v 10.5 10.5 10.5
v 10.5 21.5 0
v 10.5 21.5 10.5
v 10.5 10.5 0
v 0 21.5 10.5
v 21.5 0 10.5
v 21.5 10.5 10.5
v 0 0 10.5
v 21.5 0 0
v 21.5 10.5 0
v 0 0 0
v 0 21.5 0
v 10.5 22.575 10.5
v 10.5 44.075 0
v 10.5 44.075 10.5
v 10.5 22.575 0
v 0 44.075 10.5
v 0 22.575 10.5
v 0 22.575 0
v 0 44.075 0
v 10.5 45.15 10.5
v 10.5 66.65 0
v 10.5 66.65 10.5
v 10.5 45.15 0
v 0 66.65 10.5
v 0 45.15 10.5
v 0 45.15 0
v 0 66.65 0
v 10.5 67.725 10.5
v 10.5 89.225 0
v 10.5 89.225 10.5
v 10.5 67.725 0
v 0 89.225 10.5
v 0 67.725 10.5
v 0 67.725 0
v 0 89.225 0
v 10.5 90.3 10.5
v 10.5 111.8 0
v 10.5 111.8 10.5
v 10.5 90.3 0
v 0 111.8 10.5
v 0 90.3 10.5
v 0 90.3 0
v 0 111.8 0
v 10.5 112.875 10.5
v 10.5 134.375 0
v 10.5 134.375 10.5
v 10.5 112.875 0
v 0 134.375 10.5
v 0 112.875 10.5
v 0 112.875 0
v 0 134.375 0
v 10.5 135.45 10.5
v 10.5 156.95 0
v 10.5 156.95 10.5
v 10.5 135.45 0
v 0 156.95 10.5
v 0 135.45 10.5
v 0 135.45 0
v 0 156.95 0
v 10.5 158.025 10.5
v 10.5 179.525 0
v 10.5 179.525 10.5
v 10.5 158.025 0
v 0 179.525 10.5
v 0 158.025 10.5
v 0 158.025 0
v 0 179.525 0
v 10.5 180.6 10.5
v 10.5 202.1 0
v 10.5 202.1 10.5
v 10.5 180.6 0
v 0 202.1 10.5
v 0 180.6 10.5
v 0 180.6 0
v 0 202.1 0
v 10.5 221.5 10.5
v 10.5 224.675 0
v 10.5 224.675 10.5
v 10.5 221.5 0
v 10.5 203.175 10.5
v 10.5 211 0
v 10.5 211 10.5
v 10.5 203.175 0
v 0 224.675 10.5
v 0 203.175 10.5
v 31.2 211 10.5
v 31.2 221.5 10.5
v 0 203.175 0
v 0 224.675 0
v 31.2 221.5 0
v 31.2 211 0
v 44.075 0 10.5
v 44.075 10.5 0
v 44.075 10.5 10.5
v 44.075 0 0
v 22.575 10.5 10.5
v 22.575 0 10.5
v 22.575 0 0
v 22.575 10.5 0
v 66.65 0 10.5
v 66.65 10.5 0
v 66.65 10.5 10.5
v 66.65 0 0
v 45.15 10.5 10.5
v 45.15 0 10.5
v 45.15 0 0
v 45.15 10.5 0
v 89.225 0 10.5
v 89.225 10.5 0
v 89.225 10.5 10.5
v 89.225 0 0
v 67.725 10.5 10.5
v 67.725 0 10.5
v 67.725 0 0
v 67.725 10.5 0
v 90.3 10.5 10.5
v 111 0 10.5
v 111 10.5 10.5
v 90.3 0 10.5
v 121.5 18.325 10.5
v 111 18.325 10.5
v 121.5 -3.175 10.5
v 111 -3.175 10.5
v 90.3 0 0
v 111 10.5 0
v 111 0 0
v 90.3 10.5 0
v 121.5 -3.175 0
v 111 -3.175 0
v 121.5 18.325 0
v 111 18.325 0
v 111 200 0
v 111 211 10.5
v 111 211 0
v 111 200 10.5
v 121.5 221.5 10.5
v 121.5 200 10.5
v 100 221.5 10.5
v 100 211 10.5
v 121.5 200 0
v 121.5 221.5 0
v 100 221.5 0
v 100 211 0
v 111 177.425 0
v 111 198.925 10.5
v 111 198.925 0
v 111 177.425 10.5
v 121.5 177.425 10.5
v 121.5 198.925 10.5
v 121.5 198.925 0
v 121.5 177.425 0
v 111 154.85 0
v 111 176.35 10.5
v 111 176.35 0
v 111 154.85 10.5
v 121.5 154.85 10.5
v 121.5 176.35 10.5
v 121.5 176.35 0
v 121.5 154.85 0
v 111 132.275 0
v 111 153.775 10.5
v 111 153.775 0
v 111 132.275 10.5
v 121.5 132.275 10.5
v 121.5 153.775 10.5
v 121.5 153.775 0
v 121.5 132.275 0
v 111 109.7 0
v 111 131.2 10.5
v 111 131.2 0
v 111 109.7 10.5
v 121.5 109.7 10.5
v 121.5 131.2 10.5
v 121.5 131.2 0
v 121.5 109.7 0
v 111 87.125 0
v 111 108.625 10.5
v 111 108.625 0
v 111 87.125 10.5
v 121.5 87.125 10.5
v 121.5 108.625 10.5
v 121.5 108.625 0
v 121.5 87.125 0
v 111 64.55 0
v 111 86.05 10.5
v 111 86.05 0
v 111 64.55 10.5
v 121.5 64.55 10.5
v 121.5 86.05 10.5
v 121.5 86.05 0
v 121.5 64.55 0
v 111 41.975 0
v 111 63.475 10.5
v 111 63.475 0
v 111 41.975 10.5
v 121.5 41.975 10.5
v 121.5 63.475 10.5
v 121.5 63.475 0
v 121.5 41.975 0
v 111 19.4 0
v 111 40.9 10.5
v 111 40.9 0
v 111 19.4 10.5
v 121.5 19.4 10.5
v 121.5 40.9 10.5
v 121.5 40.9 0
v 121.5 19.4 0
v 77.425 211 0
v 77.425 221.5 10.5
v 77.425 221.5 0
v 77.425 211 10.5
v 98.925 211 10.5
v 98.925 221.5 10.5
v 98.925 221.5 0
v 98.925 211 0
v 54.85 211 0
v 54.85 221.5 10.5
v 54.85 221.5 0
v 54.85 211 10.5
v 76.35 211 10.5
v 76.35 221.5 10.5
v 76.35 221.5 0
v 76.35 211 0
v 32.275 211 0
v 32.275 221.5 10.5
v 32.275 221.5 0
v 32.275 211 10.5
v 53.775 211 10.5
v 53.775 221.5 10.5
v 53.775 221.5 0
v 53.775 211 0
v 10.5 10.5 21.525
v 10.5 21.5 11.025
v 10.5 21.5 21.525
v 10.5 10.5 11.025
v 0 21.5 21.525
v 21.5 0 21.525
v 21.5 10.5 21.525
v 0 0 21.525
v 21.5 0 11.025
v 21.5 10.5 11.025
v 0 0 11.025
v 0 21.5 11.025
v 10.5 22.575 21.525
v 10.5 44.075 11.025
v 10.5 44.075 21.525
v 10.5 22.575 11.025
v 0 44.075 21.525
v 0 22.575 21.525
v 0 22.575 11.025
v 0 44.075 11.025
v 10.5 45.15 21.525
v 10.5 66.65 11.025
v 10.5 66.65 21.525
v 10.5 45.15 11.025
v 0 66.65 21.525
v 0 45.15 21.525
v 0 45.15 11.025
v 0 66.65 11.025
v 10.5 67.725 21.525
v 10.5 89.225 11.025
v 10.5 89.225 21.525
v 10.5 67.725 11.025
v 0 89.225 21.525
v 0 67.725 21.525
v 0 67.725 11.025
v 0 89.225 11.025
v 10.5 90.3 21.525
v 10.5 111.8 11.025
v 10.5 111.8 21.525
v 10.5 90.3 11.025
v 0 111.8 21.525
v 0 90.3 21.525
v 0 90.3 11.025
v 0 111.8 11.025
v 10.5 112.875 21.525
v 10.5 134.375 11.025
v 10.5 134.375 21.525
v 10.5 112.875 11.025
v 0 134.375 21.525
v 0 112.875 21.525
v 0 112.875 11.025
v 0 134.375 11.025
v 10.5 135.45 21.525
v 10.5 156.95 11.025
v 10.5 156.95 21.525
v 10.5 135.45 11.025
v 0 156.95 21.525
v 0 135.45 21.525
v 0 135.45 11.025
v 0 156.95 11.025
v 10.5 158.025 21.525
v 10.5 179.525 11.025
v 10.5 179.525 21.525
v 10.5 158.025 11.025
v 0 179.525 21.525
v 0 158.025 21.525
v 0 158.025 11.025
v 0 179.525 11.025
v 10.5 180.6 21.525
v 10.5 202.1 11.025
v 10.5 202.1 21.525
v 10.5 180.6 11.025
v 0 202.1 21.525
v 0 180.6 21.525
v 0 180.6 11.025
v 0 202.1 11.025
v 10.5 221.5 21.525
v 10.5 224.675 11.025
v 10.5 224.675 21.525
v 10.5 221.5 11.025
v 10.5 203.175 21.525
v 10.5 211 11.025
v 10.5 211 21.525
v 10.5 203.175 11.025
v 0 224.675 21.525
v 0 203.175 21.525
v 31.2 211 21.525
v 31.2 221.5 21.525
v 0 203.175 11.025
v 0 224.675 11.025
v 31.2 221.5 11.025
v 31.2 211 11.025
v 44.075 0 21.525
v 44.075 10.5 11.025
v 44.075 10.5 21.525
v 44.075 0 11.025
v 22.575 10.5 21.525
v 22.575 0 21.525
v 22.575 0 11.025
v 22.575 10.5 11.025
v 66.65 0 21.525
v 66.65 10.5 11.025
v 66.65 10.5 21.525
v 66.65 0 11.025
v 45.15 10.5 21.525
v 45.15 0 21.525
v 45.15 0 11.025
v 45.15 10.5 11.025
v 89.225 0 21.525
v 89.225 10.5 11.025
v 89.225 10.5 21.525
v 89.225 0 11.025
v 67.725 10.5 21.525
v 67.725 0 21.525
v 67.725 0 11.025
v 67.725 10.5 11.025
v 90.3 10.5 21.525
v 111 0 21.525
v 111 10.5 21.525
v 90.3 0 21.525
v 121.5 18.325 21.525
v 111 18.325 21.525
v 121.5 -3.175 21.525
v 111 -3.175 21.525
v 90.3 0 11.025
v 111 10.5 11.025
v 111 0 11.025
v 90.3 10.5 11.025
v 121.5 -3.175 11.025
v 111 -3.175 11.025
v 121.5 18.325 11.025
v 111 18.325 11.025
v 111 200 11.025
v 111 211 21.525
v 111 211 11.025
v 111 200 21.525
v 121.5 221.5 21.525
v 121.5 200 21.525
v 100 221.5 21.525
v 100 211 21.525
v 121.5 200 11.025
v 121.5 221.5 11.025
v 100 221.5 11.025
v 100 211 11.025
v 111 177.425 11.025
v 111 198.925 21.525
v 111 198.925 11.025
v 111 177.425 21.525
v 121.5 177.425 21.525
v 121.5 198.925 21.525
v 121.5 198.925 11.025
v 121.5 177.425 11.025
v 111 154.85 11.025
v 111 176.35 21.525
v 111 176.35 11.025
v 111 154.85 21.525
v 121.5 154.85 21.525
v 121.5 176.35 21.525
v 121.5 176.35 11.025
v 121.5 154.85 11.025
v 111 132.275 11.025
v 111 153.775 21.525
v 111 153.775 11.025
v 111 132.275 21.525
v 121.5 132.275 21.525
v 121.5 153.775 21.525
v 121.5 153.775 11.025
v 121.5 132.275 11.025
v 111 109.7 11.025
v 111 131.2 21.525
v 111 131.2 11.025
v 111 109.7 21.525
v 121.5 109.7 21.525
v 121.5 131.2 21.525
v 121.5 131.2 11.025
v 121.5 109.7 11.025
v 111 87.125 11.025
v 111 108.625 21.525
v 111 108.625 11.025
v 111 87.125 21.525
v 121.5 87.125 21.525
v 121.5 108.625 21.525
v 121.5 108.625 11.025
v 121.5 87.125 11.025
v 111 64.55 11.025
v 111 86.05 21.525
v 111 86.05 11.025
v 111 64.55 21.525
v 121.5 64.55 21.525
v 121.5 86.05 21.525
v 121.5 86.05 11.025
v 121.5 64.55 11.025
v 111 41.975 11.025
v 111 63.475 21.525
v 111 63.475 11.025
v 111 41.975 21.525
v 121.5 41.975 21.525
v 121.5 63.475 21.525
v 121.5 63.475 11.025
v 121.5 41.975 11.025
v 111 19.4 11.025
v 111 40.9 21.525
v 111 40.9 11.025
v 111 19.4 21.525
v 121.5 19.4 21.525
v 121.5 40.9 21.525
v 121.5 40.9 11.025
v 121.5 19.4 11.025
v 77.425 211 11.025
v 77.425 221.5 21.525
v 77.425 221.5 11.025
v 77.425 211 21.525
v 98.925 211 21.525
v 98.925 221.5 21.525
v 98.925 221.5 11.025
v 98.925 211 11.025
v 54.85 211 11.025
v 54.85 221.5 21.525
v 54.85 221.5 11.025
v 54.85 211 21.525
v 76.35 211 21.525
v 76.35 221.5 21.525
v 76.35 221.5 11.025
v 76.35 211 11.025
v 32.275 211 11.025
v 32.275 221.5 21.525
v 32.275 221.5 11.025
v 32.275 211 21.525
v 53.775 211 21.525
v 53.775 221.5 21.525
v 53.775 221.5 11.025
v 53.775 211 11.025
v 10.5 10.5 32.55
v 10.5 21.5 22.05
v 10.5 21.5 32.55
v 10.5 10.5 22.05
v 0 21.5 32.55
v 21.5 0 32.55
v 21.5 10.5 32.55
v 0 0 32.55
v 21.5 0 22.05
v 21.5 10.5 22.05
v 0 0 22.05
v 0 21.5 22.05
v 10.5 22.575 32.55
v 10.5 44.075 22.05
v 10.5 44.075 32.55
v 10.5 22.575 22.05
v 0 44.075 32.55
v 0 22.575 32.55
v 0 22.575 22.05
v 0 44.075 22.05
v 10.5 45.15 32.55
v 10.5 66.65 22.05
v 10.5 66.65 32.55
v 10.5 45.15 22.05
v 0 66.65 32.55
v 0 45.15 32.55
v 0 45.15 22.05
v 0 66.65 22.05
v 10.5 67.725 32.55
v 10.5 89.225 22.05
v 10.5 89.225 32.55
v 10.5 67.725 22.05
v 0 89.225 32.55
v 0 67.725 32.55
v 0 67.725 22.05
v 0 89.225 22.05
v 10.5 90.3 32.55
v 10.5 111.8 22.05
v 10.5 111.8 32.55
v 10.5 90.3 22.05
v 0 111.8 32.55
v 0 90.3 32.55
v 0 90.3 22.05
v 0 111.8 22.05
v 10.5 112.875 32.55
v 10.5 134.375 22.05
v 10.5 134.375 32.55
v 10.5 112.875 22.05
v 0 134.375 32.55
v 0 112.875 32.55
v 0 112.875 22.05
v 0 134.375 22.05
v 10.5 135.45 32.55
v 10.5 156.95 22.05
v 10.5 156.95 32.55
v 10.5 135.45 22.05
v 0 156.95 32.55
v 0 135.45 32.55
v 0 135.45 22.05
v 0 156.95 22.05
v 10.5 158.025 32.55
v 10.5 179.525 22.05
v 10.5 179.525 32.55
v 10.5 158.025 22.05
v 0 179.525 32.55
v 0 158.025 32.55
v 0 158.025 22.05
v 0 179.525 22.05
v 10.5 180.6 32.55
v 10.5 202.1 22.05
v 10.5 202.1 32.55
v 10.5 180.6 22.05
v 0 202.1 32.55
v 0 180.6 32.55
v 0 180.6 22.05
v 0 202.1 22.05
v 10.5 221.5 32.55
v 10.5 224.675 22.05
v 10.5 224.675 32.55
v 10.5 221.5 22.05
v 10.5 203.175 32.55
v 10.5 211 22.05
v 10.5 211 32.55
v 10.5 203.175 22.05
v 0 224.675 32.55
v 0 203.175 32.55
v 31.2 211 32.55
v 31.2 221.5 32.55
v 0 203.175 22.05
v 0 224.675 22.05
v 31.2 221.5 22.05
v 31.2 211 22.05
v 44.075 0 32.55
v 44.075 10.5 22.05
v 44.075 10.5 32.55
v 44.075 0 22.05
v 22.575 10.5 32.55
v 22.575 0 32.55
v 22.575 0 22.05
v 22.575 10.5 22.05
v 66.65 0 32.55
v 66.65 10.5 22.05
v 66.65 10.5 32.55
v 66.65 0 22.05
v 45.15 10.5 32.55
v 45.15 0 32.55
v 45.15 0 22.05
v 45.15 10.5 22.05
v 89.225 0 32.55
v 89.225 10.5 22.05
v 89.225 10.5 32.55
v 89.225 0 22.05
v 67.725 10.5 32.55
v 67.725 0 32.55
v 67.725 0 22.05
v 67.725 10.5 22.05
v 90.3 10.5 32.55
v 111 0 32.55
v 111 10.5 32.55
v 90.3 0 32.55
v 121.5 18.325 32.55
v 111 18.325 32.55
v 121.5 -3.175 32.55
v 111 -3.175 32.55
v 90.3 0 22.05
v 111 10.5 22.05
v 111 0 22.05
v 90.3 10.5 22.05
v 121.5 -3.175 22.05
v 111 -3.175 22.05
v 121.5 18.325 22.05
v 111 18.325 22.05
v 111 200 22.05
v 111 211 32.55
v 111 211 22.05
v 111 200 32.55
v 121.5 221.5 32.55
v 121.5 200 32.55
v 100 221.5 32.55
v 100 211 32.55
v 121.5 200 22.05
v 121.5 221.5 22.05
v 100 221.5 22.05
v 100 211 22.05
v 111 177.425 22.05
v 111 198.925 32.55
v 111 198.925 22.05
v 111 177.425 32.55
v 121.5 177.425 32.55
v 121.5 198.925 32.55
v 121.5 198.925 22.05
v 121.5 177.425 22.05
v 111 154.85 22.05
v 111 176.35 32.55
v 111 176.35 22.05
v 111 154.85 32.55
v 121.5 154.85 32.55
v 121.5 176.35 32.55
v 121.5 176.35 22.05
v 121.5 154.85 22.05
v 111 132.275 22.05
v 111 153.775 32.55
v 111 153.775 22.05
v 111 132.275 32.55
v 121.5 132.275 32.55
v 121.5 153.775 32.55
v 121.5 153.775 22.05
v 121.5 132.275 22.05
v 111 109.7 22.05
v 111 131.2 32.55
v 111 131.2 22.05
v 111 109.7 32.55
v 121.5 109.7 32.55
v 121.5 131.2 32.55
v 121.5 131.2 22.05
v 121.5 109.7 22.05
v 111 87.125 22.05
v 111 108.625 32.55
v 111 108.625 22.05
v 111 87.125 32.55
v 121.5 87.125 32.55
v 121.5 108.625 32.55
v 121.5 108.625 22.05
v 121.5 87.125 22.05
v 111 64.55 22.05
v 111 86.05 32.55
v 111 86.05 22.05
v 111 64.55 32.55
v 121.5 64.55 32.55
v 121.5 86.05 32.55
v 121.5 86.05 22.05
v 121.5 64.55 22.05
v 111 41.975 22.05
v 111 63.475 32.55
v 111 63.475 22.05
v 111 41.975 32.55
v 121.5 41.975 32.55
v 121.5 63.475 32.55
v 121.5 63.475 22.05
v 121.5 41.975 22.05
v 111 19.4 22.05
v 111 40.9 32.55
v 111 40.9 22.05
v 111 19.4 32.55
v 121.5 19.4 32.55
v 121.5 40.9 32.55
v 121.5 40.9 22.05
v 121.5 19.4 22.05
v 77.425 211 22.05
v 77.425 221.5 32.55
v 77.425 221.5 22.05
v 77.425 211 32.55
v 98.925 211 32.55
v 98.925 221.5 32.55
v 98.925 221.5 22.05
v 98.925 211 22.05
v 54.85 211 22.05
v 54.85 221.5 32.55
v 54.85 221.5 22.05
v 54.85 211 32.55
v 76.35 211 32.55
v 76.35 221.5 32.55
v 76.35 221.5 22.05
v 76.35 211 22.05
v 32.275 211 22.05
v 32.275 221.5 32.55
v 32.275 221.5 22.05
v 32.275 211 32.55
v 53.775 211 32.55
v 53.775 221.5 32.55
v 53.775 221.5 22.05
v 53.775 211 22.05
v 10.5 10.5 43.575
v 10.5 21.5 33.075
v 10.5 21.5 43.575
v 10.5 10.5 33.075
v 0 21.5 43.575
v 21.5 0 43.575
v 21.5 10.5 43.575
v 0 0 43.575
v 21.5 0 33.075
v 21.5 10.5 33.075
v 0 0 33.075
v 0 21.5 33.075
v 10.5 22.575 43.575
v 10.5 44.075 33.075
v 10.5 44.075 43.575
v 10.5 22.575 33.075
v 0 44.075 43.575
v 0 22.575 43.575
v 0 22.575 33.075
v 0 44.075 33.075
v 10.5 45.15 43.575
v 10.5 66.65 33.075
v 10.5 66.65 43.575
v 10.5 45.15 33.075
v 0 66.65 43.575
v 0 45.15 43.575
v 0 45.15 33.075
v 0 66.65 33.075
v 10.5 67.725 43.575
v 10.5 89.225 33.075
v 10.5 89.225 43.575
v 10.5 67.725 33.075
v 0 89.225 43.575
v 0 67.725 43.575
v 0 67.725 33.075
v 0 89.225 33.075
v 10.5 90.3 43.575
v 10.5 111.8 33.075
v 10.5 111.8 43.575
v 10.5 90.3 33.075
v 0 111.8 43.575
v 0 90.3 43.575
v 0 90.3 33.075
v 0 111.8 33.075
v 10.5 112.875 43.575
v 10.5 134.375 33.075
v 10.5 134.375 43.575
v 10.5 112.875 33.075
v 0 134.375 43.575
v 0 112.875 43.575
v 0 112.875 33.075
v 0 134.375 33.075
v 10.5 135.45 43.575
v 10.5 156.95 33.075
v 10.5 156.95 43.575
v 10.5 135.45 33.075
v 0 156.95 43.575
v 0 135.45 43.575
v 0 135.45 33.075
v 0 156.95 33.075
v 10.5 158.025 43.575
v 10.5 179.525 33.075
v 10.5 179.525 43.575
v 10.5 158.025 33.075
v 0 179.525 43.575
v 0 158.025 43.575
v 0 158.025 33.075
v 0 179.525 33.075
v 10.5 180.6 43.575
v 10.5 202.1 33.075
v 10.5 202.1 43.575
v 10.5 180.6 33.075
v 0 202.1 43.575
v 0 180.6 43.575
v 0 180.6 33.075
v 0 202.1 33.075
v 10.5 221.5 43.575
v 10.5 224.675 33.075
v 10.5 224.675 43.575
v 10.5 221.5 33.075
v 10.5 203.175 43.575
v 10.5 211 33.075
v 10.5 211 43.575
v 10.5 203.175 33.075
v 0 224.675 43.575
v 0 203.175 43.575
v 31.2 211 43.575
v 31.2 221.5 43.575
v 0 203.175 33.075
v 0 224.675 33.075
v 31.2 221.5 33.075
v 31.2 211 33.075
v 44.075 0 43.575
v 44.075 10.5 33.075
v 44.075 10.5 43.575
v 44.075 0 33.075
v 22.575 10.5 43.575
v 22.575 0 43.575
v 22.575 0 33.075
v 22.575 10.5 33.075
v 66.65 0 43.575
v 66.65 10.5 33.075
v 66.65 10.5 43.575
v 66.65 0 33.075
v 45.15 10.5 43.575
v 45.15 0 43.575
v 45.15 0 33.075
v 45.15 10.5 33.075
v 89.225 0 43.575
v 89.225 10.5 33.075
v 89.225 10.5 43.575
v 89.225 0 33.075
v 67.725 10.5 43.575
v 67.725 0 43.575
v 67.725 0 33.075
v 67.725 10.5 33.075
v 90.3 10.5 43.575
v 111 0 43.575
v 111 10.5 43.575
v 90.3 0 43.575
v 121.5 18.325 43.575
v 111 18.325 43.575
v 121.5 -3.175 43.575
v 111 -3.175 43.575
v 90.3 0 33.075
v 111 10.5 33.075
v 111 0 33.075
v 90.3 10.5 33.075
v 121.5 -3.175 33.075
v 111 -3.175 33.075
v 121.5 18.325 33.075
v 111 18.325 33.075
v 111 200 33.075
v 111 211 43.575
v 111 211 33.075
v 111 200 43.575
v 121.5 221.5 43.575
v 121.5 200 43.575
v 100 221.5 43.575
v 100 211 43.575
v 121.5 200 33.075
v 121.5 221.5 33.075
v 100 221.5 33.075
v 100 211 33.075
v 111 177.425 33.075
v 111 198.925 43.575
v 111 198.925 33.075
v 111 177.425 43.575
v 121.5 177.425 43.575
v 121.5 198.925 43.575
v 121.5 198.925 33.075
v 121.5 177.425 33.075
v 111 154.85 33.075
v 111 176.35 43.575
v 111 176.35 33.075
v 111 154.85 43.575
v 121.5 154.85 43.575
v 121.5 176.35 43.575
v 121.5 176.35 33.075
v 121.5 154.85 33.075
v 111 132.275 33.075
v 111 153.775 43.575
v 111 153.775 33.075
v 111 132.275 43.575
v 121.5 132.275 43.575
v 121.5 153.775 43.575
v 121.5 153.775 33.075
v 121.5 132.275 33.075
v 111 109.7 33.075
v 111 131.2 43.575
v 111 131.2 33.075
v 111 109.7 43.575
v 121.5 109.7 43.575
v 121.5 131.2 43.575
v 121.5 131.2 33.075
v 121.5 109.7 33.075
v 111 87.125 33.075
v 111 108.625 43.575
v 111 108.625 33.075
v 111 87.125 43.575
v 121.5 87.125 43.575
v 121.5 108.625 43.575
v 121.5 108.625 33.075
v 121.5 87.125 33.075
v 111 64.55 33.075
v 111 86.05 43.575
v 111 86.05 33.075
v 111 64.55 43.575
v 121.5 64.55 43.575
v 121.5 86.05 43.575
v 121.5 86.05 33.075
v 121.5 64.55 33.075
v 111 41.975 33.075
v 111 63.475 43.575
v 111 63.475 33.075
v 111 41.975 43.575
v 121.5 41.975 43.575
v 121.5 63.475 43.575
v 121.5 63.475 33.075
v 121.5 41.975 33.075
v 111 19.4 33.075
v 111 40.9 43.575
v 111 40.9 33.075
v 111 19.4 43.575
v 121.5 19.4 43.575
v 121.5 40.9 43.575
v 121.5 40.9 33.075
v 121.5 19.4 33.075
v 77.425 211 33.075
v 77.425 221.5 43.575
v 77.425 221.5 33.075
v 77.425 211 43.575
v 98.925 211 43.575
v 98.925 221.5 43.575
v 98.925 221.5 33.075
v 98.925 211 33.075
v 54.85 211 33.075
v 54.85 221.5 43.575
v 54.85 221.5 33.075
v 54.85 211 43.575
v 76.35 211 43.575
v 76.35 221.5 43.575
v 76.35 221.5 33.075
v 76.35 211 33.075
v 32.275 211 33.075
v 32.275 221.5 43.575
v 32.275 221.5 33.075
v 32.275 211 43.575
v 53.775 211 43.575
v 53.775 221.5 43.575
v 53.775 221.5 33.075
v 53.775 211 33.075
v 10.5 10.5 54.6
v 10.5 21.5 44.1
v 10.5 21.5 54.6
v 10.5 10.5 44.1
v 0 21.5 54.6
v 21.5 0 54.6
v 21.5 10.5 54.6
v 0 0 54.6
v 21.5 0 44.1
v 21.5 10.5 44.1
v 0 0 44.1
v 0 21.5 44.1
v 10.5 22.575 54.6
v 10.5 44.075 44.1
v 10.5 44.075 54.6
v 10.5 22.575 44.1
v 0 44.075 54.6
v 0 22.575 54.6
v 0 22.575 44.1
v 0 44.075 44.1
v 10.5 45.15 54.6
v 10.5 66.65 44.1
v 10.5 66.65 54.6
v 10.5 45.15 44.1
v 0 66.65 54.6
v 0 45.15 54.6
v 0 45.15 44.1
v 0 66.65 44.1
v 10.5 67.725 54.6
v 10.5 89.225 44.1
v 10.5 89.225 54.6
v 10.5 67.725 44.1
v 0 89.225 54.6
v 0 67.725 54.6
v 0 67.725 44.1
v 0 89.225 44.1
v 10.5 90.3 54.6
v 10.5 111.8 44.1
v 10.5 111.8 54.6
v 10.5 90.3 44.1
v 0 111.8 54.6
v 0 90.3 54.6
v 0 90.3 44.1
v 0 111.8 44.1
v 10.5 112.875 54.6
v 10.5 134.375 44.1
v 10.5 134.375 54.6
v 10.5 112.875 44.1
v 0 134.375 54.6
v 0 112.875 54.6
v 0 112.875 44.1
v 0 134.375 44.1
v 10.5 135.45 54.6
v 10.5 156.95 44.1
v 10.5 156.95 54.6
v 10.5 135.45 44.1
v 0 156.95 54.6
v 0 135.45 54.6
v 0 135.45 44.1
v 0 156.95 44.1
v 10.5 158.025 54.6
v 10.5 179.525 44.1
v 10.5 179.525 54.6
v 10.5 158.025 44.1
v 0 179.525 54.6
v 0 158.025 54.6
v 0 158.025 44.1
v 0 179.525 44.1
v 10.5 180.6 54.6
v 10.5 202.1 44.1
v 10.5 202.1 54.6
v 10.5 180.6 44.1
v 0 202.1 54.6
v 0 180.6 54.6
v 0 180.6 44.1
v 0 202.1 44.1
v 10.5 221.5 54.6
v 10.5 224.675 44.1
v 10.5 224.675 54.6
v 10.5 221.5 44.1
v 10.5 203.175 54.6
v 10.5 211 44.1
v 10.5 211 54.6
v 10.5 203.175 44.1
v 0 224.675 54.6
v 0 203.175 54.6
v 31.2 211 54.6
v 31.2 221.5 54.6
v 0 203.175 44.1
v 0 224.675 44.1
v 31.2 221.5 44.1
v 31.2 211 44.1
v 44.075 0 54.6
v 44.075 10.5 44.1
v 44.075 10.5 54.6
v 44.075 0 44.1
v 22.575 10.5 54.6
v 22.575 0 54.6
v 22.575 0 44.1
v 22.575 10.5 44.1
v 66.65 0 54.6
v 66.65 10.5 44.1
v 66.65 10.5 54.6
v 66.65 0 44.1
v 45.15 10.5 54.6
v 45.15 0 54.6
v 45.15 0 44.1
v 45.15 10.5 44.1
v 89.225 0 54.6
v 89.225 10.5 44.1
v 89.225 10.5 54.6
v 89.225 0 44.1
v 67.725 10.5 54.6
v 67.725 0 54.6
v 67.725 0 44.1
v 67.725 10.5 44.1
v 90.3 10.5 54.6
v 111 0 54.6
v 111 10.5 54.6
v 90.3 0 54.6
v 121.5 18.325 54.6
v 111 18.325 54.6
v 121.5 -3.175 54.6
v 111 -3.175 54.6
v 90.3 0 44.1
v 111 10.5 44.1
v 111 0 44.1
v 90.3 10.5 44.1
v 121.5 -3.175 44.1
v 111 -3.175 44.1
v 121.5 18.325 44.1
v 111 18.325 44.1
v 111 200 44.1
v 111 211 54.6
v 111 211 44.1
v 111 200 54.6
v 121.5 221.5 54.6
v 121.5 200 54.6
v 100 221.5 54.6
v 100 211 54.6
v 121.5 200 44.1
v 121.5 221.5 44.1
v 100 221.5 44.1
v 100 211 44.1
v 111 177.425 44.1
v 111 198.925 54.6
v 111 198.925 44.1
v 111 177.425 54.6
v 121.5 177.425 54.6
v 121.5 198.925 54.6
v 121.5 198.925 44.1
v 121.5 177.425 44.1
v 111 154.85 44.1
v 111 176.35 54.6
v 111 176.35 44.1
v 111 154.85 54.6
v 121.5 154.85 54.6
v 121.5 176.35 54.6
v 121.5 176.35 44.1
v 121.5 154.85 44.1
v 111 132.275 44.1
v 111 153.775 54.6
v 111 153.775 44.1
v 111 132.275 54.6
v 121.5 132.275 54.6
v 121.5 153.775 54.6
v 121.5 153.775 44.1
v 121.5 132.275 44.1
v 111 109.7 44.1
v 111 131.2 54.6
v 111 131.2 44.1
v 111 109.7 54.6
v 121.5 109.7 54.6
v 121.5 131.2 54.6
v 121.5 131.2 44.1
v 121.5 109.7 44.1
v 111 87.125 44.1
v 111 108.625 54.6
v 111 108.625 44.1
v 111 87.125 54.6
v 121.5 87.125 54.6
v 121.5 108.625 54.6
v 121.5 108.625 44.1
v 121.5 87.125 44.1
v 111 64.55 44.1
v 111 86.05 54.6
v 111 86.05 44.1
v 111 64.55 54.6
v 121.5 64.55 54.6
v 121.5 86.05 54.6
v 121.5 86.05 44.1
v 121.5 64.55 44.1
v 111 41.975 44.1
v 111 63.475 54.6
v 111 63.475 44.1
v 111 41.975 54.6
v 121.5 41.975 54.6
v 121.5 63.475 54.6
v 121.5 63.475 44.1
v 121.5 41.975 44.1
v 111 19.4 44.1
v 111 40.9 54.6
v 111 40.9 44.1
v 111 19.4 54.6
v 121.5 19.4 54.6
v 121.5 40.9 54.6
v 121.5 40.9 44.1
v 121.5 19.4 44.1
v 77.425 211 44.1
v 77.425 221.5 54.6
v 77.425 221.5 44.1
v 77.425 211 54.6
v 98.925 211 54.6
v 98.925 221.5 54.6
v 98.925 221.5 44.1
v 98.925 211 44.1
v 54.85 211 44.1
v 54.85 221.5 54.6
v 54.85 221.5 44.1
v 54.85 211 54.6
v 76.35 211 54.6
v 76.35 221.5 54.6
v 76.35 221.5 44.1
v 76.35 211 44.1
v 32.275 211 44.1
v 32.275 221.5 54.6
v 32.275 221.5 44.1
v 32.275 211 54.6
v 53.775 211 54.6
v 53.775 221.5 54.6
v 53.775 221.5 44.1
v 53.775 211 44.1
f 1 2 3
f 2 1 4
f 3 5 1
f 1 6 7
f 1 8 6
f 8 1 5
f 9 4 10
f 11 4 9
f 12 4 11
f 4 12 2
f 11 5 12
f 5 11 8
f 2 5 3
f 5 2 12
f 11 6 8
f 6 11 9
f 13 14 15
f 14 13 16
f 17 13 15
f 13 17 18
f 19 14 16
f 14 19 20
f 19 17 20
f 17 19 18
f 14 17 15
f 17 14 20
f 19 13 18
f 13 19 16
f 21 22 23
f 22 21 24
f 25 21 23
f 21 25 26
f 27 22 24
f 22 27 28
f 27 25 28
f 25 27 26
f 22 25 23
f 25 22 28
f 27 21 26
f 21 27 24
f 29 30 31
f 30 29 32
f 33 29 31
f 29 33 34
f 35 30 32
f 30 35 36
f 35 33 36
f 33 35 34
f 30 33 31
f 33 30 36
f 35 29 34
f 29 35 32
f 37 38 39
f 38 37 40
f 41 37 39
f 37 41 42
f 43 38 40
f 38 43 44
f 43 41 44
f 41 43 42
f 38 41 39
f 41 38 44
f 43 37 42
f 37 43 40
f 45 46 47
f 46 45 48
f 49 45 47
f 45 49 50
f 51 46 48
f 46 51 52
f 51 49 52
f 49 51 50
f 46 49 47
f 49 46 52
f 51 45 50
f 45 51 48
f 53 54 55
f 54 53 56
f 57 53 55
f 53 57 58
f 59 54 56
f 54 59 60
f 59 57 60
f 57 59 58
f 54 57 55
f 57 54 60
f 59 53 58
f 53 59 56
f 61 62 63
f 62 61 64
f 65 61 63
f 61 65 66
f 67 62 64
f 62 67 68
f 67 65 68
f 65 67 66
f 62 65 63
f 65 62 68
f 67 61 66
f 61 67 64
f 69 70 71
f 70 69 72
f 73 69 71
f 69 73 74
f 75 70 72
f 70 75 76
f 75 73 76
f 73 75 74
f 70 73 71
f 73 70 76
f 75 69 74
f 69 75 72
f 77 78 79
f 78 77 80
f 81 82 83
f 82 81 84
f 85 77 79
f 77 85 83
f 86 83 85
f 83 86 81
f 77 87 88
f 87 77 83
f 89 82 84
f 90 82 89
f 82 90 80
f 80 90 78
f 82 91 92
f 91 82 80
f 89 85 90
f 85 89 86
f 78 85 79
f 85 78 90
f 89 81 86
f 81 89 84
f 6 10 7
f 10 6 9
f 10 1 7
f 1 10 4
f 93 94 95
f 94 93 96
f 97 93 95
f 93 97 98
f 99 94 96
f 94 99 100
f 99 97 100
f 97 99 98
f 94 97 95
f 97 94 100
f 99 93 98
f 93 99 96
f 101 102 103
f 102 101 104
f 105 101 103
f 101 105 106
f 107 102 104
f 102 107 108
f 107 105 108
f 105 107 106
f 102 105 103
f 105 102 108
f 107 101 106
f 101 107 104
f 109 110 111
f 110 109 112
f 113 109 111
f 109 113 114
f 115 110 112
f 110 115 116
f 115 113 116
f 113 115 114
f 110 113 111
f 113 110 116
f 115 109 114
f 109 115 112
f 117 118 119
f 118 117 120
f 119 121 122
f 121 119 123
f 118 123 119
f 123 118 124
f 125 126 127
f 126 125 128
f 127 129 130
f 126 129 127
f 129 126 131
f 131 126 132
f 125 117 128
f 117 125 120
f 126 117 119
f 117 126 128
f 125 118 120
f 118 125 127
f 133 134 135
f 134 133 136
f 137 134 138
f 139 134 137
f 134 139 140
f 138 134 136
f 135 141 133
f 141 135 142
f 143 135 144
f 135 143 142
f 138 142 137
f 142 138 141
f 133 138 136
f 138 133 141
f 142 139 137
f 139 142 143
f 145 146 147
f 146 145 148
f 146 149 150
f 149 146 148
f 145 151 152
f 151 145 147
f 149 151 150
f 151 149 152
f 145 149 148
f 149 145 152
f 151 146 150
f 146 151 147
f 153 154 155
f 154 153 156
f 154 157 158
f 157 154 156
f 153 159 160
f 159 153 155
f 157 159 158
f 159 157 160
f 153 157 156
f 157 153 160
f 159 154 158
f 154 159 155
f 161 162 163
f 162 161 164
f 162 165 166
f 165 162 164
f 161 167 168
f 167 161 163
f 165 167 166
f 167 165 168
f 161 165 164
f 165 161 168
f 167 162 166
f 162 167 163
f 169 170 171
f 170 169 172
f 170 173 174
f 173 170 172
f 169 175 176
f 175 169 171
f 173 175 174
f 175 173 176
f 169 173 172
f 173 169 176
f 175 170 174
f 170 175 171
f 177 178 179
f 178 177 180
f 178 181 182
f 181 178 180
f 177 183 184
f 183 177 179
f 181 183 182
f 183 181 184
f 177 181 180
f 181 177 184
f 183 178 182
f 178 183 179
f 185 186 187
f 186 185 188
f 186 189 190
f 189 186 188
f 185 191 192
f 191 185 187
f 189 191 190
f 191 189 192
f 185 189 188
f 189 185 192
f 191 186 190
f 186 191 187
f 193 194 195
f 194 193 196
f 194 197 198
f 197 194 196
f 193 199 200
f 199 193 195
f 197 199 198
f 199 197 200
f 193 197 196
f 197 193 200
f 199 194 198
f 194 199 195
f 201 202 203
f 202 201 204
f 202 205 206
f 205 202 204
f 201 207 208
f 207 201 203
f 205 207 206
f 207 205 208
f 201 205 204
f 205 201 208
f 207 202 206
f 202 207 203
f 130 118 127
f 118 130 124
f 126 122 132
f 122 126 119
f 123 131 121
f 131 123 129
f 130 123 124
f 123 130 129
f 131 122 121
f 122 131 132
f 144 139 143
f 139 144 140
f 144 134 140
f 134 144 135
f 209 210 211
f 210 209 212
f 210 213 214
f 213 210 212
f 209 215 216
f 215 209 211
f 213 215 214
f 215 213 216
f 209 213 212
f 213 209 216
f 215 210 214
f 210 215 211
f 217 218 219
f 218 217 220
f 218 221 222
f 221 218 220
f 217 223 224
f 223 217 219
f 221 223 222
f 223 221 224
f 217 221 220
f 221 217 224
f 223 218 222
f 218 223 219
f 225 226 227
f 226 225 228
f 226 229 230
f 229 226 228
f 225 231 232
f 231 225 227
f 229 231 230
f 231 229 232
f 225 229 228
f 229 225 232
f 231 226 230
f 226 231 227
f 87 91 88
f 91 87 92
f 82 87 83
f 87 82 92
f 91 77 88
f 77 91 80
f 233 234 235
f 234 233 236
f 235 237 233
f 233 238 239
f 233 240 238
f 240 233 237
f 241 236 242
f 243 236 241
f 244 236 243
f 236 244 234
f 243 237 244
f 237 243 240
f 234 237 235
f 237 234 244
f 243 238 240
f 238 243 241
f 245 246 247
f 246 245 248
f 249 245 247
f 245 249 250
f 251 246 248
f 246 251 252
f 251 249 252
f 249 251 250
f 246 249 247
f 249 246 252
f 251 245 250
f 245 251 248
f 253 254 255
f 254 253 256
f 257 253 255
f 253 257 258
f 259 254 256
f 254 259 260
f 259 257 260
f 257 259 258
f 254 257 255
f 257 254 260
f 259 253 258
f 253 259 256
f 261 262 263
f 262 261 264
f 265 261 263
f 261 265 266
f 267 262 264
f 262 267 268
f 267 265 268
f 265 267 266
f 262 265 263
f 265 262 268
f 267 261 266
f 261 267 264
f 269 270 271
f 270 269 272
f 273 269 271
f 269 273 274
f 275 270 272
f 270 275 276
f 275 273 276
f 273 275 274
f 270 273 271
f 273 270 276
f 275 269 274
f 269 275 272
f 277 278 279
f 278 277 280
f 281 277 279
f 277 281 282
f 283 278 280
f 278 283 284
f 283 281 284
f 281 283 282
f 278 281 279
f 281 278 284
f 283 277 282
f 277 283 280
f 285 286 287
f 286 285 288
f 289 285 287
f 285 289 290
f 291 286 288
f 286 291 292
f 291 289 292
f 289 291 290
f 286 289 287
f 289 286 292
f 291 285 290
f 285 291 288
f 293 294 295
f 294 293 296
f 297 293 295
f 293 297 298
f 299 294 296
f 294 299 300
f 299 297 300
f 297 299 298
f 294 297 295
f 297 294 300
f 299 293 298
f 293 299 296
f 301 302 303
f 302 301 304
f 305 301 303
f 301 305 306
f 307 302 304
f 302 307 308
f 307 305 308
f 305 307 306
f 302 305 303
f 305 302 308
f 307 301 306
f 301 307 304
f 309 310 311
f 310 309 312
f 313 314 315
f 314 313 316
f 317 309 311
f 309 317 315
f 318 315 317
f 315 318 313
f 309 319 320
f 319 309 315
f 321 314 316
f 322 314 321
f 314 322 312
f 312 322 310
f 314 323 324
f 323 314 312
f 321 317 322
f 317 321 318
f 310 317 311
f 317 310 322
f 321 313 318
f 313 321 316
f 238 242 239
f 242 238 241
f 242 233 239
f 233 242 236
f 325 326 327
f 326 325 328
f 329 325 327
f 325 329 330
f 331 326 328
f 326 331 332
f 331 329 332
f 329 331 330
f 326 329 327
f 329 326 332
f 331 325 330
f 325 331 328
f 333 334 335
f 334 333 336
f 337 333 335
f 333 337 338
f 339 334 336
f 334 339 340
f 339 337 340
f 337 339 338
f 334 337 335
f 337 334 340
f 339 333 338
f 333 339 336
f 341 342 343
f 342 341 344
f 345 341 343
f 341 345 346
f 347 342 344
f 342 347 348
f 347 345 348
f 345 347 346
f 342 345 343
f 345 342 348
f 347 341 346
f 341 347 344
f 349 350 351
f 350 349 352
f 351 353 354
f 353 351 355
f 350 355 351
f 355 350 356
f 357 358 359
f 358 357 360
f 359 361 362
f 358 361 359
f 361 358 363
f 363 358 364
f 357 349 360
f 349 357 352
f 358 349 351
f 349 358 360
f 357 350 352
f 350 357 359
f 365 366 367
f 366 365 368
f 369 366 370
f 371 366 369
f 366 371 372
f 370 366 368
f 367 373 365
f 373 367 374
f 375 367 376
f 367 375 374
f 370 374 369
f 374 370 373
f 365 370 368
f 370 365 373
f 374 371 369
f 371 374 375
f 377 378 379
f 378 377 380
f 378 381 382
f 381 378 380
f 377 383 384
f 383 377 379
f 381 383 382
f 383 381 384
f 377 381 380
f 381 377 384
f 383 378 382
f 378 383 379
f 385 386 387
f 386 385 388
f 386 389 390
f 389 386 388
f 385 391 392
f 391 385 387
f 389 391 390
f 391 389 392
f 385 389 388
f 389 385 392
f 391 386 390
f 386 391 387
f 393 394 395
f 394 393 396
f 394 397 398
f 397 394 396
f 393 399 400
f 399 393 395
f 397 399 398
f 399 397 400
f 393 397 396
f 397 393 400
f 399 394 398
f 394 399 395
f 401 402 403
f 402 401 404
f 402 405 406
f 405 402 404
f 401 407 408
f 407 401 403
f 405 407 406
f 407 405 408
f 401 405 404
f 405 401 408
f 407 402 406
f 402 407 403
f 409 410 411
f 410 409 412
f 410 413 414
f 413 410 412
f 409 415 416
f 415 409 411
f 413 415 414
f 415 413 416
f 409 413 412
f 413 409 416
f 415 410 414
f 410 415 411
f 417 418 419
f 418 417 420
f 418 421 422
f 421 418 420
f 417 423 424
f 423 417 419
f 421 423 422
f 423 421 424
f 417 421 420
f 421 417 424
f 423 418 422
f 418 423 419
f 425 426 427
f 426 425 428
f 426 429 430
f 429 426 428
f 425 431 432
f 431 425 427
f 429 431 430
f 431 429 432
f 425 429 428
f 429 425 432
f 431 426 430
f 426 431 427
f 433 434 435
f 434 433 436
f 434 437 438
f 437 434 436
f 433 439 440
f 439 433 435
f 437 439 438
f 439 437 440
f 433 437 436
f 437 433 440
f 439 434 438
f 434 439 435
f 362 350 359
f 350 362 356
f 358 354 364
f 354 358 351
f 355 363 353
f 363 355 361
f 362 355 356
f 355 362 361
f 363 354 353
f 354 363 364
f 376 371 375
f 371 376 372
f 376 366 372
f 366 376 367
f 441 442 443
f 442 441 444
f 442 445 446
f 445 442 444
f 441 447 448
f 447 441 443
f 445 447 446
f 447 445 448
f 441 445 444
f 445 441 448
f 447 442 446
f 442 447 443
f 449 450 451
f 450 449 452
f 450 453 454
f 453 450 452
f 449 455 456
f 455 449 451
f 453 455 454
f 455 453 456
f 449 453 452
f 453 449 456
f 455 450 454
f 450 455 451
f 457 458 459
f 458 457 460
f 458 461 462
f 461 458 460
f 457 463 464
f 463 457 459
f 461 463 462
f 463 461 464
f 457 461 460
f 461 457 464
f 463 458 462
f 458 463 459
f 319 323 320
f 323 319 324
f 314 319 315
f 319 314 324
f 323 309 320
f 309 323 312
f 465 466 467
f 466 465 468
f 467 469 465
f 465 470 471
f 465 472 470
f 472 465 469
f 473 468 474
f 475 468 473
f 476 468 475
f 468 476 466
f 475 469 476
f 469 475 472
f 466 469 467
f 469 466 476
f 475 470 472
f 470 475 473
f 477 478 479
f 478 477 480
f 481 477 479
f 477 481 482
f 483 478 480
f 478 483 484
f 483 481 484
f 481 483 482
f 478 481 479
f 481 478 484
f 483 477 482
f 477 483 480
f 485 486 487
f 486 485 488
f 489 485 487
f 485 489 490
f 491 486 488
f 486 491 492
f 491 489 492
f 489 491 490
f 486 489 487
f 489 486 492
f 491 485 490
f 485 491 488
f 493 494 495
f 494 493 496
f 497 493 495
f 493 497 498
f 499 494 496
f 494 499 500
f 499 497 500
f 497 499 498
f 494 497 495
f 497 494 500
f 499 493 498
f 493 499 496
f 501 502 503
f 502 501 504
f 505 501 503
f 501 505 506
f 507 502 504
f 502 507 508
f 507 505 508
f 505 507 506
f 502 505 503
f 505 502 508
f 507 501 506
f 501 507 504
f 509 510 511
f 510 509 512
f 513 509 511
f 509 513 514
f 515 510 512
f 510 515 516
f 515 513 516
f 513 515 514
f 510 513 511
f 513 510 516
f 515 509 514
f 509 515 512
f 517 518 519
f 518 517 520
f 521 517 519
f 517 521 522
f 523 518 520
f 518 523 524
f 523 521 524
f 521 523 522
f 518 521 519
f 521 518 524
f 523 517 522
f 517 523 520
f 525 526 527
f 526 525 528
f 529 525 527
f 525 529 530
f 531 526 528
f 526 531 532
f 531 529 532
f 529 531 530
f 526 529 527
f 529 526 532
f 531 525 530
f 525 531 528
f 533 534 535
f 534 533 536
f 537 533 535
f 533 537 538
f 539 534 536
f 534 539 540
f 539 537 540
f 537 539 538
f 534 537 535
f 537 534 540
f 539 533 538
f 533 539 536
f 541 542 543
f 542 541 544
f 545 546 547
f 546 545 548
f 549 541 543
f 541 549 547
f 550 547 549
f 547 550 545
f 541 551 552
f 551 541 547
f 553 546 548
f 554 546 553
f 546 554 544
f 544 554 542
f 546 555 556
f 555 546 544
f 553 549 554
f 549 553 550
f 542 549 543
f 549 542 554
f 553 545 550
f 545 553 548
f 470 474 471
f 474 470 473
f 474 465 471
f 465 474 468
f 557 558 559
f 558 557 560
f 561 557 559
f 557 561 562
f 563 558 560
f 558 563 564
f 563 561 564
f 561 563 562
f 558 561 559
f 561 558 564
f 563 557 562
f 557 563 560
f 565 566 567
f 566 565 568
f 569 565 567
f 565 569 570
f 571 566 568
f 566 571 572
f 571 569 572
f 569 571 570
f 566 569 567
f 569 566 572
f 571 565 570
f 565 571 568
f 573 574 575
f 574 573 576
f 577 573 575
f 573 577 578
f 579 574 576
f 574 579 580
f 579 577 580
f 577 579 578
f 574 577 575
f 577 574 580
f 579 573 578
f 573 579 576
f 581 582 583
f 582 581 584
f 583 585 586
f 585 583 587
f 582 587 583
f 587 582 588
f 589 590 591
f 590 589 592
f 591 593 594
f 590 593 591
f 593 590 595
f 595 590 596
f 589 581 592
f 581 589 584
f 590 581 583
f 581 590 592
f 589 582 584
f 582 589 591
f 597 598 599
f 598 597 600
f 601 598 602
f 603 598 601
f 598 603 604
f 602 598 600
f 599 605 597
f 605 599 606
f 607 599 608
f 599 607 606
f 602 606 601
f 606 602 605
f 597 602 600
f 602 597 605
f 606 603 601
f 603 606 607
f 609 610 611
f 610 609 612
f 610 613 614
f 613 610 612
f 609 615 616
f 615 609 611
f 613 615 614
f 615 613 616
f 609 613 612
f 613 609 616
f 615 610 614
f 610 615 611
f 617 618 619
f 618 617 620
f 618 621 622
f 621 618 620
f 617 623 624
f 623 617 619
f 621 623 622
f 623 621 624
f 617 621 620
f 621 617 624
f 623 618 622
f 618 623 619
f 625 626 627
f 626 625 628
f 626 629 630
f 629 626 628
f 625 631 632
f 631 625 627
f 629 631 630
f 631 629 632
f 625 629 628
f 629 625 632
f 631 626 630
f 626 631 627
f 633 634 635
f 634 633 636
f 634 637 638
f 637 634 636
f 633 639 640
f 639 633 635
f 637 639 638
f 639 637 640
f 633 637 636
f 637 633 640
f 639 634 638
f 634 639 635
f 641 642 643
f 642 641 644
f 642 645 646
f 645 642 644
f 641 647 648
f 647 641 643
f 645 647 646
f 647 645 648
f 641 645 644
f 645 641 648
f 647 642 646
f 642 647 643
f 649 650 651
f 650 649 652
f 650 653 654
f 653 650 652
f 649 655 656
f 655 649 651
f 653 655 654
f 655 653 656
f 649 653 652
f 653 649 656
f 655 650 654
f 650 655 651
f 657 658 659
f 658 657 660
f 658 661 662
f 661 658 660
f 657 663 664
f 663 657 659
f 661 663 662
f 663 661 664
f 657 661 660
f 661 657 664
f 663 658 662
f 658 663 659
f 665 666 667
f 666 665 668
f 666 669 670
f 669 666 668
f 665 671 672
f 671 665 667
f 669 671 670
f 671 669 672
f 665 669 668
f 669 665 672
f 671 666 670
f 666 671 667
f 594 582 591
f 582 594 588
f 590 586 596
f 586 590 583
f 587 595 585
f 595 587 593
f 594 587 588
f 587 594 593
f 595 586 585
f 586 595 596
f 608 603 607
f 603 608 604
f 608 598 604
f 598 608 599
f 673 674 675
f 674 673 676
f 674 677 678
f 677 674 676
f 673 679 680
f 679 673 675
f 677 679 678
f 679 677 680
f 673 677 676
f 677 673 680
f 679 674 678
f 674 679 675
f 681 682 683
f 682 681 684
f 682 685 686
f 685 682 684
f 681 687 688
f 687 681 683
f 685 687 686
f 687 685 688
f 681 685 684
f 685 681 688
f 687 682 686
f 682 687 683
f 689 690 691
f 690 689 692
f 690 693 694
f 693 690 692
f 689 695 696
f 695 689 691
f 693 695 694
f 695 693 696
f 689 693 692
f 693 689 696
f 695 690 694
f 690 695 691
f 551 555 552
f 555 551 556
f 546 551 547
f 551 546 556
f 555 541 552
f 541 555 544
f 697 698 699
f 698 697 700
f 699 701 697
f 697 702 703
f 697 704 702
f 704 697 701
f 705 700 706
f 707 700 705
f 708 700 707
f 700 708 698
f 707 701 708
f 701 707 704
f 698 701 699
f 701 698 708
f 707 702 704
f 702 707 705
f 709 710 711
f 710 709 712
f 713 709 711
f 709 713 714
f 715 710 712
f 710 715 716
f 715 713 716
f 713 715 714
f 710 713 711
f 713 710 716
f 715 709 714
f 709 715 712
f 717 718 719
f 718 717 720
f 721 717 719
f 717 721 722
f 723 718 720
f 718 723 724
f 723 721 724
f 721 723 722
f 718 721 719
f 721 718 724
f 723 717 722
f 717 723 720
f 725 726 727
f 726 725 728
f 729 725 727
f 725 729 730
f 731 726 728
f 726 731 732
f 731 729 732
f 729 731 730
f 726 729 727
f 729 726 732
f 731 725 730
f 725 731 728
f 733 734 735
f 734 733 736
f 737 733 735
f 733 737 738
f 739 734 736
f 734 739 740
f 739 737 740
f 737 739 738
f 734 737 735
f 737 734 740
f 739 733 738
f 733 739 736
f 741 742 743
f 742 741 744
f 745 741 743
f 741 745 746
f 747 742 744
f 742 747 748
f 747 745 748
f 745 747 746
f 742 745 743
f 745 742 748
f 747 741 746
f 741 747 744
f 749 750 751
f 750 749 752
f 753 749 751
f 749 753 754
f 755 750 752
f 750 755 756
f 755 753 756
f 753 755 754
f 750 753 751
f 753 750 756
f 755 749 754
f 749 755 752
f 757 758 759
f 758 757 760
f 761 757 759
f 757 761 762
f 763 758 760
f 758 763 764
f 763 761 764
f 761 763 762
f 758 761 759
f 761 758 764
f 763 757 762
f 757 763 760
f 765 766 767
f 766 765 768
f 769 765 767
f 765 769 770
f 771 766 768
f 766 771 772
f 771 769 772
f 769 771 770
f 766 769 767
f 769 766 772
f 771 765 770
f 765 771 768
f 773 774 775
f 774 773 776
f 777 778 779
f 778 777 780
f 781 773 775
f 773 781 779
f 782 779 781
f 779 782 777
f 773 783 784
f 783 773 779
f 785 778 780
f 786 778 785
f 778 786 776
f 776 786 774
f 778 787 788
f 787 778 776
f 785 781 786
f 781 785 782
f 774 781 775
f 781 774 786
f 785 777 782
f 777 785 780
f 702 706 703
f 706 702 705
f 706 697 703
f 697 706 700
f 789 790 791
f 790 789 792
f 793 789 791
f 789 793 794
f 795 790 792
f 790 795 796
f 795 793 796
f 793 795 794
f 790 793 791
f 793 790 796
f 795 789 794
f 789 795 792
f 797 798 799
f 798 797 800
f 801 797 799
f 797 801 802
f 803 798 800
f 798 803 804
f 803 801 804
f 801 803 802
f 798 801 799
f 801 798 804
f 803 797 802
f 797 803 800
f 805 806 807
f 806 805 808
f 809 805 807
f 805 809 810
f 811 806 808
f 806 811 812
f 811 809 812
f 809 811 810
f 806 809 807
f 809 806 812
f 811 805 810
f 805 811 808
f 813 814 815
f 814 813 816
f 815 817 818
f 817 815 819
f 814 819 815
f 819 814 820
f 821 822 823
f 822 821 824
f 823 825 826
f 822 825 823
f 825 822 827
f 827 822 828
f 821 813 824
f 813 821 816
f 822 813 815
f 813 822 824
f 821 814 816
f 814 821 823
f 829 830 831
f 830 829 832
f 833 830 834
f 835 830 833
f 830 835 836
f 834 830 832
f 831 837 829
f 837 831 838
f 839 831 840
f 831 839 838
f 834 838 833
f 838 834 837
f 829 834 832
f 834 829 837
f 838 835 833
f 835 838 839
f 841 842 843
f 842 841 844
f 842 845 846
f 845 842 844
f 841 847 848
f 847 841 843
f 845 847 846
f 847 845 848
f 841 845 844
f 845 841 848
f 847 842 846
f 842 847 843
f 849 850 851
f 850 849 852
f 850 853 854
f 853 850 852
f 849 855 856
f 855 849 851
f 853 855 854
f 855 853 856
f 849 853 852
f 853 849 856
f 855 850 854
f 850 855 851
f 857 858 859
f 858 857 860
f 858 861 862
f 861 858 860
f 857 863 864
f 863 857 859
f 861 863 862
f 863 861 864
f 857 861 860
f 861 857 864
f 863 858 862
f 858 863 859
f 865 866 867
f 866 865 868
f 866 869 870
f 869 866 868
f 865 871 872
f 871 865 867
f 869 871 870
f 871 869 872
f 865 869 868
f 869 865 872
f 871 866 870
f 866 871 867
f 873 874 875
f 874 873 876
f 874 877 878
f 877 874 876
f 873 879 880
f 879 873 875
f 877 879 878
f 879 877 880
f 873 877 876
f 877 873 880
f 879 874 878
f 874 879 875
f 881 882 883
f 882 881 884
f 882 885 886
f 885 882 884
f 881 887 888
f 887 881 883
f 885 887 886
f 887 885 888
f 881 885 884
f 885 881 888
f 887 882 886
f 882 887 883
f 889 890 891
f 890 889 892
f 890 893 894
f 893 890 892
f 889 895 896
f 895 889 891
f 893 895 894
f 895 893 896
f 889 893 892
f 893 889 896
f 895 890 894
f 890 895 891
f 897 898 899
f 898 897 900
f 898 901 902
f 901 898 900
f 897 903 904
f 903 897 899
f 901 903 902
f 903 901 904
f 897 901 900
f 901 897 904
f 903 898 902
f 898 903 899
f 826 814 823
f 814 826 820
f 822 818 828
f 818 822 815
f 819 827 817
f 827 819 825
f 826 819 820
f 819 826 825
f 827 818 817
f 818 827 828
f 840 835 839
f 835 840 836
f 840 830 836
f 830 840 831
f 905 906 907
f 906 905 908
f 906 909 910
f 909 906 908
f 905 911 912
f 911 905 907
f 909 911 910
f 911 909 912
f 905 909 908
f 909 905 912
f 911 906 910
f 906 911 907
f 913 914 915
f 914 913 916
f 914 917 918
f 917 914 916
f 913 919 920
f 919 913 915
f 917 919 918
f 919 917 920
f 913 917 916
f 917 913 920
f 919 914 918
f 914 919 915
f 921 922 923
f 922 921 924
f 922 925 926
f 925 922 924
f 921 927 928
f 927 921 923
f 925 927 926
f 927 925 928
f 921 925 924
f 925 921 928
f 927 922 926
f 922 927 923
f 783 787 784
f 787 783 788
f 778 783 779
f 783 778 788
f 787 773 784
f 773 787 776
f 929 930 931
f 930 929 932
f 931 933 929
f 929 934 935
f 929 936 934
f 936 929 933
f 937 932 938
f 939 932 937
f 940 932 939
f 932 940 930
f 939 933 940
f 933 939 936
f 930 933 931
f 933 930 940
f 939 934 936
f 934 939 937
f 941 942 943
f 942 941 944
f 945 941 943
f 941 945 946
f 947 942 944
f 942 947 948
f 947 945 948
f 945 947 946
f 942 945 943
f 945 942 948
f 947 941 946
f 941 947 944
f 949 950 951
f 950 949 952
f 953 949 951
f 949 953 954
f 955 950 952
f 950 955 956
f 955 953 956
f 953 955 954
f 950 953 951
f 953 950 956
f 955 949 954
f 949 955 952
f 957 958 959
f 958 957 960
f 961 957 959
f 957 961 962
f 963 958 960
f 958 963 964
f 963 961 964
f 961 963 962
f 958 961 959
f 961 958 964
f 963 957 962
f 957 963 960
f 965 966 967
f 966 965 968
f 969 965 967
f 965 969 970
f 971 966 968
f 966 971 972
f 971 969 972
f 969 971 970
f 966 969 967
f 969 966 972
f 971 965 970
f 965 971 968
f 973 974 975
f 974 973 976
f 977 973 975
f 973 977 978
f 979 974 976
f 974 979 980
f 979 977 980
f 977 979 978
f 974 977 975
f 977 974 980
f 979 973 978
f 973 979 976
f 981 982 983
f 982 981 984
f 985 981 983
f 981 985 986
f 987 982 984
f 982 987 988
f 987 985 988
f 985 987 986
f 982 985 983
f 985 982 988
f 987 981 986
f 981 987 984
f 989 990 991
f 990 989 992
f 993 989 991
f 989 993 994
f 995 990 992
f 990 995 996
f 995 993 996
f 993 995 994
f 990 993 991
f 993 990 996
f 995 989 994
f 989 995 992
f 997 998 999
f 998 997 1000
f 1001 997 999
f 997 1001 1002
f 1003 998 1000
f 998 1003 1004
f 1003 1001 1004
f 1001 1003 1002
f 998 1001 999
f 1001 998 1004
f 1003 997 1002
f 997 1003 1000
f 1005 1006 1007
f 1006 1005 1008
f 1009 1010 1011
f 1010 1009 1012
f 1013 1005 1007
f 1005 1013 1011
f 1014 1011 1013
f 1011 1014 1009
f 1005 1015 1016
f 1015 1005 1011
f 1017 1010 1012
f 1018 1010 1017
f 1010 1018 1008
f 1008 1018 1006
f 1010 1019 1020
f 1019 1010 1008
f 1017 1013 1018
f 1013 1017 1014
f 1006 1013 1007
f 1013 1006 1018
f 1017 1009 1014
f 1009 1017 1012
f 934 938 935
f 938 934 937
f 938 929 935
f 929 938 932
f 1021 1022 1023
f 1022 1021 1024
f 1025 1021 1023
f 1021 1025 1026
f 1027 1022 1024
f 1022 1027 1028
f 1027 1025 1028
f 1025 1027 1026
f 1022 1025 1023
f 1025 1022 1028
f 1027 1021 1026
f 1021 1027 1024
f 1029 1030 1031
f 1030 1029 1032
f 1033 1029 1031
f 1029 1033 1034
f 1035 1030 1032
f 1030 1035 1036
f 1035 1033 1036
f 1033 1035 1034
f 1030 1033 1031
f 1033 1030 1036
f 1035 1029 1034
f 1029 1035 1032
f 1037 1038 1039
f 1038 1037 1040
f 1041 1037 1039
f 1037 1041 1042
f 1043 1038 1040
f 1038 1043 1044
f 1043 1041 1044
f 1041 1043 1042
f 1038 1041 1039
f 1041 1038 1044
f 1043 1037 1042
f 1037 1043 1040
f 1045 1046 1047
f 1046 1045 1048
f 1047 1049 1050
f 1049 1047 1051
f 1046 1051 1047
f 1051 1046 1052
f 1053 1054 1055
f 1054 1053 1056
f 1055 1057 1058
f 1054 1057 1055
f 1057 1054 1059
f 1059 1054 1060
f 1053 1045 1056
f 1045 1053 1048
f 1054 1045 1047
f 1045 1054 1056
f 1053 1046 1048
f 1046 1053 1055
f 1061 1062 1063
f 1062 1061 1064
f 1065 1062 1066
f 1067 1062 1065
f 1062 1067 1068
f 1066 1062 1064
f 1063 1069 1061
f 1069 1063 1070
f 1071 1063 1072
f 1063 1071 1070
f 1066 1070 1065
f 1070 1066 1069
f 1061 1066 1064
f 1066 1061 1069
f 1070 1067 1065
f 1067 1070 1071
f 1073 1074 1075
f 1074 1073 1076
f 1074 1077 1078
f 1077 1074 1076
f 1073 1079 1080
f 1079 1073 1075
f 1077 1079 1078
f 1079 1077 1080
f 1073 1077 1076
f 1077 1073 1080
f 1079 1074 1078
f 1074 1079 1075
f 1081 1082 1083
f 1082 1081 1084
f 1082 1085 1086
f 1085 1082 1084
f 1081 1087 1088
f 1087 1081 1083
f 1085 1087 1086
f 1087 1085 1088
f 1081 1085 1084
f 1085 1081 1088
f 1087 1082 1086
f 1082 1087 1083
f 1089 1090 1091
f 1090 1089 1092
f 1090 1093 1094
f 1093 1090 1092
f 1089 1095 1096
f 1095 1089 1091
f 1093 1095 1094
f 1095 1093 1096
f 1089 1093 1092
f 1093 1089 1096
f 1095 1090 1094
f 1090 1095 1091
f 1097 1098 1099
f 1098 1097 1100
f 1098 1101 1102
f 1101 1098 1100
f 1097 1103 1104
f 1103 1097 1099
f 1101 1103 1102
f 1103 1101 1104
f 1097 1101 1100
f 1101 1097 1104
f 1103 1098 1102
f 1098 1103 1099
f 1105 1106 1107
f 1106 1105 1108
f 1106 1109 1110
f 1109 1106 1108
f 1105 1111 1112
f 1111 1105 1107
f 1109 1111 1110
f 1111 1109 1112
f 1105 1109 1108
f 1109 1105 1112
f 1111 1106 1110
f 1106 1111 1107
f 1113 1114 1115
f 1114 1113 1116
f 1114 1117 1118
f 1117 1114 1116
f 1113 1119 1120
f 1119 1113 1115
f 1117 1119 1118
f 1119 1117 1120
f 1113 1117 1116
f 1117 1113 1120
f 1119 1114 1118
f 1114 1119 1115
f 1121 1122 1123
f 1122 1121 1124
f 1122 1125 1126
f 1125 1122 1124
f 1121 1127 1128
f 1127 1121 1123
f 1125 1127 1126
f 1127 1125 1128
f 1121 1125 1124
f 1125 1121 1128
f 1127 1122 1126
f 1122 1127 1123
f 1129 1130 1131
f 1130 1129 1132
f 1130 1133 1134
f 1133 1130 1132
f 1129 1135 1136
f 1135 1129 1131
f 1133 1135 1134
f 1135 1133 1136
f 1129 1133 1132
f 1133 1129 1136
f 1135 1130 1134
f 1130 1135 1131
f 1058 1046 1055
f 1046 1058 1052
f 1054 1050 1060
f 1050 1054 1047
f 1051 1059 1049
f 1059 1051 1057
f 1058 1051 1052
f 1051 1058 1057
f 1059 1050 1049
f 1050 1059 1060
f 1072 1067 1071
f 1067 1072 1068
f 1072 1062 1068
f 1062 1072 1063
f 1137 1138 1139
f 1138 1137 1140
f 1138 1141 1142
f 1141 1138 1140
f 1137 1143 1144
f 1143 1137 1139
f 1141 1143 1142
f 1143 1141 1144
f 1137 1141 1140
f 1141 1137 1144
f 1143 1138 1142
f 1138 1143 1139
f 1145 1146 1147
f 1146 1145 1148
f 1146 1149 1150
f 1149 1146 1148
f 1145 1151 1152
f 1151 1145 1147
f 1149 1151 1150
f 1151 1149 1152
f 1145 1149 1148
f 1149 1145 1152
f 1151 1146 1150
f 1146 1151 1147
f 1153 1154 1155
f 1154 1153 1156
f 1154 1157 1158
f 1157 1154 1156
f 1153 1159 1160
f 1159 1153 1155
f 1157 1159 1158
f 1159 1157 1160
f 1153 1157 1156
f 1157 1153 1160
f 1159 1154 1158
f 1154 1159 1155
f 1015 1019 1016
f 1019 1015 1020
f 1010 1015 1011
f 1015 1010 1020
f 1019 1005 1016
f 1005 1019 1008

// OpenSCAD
/*Digester Size*/
dl=200;//length
dw=100;//width
dh=50;
/*Brick Parameters*/
h=10.5;//height
w=10.5;//width
l=21.5;//length

i_end=dl/l;
z_end=dw/l;
y_end=dh/h;



module frame(){
module line(){
for (i=[0:i_end])
   translate([0,i*(l+l*0.05),0])
     cube([w,l,h]);


for (z=[0:z_end])
   translate([z*(l+l*0.05),0,0])
     rotate()
     cube([l,w,h]);
}

line();
translate([dw+l,dl+l,0])
rotate([180,180,0])line();
}

for (i=[0:y_end])
  translate([0,0,i*(h+(h*0.05))])
  //translate([0,0,20*i])
    frame();


/*$fn=64;
for ( i = [0 : 5] ){
    rotate( i * 60, [1, 0, 0])
    translate([0, 10, 0])
    sphere(r = 10);
}*/
